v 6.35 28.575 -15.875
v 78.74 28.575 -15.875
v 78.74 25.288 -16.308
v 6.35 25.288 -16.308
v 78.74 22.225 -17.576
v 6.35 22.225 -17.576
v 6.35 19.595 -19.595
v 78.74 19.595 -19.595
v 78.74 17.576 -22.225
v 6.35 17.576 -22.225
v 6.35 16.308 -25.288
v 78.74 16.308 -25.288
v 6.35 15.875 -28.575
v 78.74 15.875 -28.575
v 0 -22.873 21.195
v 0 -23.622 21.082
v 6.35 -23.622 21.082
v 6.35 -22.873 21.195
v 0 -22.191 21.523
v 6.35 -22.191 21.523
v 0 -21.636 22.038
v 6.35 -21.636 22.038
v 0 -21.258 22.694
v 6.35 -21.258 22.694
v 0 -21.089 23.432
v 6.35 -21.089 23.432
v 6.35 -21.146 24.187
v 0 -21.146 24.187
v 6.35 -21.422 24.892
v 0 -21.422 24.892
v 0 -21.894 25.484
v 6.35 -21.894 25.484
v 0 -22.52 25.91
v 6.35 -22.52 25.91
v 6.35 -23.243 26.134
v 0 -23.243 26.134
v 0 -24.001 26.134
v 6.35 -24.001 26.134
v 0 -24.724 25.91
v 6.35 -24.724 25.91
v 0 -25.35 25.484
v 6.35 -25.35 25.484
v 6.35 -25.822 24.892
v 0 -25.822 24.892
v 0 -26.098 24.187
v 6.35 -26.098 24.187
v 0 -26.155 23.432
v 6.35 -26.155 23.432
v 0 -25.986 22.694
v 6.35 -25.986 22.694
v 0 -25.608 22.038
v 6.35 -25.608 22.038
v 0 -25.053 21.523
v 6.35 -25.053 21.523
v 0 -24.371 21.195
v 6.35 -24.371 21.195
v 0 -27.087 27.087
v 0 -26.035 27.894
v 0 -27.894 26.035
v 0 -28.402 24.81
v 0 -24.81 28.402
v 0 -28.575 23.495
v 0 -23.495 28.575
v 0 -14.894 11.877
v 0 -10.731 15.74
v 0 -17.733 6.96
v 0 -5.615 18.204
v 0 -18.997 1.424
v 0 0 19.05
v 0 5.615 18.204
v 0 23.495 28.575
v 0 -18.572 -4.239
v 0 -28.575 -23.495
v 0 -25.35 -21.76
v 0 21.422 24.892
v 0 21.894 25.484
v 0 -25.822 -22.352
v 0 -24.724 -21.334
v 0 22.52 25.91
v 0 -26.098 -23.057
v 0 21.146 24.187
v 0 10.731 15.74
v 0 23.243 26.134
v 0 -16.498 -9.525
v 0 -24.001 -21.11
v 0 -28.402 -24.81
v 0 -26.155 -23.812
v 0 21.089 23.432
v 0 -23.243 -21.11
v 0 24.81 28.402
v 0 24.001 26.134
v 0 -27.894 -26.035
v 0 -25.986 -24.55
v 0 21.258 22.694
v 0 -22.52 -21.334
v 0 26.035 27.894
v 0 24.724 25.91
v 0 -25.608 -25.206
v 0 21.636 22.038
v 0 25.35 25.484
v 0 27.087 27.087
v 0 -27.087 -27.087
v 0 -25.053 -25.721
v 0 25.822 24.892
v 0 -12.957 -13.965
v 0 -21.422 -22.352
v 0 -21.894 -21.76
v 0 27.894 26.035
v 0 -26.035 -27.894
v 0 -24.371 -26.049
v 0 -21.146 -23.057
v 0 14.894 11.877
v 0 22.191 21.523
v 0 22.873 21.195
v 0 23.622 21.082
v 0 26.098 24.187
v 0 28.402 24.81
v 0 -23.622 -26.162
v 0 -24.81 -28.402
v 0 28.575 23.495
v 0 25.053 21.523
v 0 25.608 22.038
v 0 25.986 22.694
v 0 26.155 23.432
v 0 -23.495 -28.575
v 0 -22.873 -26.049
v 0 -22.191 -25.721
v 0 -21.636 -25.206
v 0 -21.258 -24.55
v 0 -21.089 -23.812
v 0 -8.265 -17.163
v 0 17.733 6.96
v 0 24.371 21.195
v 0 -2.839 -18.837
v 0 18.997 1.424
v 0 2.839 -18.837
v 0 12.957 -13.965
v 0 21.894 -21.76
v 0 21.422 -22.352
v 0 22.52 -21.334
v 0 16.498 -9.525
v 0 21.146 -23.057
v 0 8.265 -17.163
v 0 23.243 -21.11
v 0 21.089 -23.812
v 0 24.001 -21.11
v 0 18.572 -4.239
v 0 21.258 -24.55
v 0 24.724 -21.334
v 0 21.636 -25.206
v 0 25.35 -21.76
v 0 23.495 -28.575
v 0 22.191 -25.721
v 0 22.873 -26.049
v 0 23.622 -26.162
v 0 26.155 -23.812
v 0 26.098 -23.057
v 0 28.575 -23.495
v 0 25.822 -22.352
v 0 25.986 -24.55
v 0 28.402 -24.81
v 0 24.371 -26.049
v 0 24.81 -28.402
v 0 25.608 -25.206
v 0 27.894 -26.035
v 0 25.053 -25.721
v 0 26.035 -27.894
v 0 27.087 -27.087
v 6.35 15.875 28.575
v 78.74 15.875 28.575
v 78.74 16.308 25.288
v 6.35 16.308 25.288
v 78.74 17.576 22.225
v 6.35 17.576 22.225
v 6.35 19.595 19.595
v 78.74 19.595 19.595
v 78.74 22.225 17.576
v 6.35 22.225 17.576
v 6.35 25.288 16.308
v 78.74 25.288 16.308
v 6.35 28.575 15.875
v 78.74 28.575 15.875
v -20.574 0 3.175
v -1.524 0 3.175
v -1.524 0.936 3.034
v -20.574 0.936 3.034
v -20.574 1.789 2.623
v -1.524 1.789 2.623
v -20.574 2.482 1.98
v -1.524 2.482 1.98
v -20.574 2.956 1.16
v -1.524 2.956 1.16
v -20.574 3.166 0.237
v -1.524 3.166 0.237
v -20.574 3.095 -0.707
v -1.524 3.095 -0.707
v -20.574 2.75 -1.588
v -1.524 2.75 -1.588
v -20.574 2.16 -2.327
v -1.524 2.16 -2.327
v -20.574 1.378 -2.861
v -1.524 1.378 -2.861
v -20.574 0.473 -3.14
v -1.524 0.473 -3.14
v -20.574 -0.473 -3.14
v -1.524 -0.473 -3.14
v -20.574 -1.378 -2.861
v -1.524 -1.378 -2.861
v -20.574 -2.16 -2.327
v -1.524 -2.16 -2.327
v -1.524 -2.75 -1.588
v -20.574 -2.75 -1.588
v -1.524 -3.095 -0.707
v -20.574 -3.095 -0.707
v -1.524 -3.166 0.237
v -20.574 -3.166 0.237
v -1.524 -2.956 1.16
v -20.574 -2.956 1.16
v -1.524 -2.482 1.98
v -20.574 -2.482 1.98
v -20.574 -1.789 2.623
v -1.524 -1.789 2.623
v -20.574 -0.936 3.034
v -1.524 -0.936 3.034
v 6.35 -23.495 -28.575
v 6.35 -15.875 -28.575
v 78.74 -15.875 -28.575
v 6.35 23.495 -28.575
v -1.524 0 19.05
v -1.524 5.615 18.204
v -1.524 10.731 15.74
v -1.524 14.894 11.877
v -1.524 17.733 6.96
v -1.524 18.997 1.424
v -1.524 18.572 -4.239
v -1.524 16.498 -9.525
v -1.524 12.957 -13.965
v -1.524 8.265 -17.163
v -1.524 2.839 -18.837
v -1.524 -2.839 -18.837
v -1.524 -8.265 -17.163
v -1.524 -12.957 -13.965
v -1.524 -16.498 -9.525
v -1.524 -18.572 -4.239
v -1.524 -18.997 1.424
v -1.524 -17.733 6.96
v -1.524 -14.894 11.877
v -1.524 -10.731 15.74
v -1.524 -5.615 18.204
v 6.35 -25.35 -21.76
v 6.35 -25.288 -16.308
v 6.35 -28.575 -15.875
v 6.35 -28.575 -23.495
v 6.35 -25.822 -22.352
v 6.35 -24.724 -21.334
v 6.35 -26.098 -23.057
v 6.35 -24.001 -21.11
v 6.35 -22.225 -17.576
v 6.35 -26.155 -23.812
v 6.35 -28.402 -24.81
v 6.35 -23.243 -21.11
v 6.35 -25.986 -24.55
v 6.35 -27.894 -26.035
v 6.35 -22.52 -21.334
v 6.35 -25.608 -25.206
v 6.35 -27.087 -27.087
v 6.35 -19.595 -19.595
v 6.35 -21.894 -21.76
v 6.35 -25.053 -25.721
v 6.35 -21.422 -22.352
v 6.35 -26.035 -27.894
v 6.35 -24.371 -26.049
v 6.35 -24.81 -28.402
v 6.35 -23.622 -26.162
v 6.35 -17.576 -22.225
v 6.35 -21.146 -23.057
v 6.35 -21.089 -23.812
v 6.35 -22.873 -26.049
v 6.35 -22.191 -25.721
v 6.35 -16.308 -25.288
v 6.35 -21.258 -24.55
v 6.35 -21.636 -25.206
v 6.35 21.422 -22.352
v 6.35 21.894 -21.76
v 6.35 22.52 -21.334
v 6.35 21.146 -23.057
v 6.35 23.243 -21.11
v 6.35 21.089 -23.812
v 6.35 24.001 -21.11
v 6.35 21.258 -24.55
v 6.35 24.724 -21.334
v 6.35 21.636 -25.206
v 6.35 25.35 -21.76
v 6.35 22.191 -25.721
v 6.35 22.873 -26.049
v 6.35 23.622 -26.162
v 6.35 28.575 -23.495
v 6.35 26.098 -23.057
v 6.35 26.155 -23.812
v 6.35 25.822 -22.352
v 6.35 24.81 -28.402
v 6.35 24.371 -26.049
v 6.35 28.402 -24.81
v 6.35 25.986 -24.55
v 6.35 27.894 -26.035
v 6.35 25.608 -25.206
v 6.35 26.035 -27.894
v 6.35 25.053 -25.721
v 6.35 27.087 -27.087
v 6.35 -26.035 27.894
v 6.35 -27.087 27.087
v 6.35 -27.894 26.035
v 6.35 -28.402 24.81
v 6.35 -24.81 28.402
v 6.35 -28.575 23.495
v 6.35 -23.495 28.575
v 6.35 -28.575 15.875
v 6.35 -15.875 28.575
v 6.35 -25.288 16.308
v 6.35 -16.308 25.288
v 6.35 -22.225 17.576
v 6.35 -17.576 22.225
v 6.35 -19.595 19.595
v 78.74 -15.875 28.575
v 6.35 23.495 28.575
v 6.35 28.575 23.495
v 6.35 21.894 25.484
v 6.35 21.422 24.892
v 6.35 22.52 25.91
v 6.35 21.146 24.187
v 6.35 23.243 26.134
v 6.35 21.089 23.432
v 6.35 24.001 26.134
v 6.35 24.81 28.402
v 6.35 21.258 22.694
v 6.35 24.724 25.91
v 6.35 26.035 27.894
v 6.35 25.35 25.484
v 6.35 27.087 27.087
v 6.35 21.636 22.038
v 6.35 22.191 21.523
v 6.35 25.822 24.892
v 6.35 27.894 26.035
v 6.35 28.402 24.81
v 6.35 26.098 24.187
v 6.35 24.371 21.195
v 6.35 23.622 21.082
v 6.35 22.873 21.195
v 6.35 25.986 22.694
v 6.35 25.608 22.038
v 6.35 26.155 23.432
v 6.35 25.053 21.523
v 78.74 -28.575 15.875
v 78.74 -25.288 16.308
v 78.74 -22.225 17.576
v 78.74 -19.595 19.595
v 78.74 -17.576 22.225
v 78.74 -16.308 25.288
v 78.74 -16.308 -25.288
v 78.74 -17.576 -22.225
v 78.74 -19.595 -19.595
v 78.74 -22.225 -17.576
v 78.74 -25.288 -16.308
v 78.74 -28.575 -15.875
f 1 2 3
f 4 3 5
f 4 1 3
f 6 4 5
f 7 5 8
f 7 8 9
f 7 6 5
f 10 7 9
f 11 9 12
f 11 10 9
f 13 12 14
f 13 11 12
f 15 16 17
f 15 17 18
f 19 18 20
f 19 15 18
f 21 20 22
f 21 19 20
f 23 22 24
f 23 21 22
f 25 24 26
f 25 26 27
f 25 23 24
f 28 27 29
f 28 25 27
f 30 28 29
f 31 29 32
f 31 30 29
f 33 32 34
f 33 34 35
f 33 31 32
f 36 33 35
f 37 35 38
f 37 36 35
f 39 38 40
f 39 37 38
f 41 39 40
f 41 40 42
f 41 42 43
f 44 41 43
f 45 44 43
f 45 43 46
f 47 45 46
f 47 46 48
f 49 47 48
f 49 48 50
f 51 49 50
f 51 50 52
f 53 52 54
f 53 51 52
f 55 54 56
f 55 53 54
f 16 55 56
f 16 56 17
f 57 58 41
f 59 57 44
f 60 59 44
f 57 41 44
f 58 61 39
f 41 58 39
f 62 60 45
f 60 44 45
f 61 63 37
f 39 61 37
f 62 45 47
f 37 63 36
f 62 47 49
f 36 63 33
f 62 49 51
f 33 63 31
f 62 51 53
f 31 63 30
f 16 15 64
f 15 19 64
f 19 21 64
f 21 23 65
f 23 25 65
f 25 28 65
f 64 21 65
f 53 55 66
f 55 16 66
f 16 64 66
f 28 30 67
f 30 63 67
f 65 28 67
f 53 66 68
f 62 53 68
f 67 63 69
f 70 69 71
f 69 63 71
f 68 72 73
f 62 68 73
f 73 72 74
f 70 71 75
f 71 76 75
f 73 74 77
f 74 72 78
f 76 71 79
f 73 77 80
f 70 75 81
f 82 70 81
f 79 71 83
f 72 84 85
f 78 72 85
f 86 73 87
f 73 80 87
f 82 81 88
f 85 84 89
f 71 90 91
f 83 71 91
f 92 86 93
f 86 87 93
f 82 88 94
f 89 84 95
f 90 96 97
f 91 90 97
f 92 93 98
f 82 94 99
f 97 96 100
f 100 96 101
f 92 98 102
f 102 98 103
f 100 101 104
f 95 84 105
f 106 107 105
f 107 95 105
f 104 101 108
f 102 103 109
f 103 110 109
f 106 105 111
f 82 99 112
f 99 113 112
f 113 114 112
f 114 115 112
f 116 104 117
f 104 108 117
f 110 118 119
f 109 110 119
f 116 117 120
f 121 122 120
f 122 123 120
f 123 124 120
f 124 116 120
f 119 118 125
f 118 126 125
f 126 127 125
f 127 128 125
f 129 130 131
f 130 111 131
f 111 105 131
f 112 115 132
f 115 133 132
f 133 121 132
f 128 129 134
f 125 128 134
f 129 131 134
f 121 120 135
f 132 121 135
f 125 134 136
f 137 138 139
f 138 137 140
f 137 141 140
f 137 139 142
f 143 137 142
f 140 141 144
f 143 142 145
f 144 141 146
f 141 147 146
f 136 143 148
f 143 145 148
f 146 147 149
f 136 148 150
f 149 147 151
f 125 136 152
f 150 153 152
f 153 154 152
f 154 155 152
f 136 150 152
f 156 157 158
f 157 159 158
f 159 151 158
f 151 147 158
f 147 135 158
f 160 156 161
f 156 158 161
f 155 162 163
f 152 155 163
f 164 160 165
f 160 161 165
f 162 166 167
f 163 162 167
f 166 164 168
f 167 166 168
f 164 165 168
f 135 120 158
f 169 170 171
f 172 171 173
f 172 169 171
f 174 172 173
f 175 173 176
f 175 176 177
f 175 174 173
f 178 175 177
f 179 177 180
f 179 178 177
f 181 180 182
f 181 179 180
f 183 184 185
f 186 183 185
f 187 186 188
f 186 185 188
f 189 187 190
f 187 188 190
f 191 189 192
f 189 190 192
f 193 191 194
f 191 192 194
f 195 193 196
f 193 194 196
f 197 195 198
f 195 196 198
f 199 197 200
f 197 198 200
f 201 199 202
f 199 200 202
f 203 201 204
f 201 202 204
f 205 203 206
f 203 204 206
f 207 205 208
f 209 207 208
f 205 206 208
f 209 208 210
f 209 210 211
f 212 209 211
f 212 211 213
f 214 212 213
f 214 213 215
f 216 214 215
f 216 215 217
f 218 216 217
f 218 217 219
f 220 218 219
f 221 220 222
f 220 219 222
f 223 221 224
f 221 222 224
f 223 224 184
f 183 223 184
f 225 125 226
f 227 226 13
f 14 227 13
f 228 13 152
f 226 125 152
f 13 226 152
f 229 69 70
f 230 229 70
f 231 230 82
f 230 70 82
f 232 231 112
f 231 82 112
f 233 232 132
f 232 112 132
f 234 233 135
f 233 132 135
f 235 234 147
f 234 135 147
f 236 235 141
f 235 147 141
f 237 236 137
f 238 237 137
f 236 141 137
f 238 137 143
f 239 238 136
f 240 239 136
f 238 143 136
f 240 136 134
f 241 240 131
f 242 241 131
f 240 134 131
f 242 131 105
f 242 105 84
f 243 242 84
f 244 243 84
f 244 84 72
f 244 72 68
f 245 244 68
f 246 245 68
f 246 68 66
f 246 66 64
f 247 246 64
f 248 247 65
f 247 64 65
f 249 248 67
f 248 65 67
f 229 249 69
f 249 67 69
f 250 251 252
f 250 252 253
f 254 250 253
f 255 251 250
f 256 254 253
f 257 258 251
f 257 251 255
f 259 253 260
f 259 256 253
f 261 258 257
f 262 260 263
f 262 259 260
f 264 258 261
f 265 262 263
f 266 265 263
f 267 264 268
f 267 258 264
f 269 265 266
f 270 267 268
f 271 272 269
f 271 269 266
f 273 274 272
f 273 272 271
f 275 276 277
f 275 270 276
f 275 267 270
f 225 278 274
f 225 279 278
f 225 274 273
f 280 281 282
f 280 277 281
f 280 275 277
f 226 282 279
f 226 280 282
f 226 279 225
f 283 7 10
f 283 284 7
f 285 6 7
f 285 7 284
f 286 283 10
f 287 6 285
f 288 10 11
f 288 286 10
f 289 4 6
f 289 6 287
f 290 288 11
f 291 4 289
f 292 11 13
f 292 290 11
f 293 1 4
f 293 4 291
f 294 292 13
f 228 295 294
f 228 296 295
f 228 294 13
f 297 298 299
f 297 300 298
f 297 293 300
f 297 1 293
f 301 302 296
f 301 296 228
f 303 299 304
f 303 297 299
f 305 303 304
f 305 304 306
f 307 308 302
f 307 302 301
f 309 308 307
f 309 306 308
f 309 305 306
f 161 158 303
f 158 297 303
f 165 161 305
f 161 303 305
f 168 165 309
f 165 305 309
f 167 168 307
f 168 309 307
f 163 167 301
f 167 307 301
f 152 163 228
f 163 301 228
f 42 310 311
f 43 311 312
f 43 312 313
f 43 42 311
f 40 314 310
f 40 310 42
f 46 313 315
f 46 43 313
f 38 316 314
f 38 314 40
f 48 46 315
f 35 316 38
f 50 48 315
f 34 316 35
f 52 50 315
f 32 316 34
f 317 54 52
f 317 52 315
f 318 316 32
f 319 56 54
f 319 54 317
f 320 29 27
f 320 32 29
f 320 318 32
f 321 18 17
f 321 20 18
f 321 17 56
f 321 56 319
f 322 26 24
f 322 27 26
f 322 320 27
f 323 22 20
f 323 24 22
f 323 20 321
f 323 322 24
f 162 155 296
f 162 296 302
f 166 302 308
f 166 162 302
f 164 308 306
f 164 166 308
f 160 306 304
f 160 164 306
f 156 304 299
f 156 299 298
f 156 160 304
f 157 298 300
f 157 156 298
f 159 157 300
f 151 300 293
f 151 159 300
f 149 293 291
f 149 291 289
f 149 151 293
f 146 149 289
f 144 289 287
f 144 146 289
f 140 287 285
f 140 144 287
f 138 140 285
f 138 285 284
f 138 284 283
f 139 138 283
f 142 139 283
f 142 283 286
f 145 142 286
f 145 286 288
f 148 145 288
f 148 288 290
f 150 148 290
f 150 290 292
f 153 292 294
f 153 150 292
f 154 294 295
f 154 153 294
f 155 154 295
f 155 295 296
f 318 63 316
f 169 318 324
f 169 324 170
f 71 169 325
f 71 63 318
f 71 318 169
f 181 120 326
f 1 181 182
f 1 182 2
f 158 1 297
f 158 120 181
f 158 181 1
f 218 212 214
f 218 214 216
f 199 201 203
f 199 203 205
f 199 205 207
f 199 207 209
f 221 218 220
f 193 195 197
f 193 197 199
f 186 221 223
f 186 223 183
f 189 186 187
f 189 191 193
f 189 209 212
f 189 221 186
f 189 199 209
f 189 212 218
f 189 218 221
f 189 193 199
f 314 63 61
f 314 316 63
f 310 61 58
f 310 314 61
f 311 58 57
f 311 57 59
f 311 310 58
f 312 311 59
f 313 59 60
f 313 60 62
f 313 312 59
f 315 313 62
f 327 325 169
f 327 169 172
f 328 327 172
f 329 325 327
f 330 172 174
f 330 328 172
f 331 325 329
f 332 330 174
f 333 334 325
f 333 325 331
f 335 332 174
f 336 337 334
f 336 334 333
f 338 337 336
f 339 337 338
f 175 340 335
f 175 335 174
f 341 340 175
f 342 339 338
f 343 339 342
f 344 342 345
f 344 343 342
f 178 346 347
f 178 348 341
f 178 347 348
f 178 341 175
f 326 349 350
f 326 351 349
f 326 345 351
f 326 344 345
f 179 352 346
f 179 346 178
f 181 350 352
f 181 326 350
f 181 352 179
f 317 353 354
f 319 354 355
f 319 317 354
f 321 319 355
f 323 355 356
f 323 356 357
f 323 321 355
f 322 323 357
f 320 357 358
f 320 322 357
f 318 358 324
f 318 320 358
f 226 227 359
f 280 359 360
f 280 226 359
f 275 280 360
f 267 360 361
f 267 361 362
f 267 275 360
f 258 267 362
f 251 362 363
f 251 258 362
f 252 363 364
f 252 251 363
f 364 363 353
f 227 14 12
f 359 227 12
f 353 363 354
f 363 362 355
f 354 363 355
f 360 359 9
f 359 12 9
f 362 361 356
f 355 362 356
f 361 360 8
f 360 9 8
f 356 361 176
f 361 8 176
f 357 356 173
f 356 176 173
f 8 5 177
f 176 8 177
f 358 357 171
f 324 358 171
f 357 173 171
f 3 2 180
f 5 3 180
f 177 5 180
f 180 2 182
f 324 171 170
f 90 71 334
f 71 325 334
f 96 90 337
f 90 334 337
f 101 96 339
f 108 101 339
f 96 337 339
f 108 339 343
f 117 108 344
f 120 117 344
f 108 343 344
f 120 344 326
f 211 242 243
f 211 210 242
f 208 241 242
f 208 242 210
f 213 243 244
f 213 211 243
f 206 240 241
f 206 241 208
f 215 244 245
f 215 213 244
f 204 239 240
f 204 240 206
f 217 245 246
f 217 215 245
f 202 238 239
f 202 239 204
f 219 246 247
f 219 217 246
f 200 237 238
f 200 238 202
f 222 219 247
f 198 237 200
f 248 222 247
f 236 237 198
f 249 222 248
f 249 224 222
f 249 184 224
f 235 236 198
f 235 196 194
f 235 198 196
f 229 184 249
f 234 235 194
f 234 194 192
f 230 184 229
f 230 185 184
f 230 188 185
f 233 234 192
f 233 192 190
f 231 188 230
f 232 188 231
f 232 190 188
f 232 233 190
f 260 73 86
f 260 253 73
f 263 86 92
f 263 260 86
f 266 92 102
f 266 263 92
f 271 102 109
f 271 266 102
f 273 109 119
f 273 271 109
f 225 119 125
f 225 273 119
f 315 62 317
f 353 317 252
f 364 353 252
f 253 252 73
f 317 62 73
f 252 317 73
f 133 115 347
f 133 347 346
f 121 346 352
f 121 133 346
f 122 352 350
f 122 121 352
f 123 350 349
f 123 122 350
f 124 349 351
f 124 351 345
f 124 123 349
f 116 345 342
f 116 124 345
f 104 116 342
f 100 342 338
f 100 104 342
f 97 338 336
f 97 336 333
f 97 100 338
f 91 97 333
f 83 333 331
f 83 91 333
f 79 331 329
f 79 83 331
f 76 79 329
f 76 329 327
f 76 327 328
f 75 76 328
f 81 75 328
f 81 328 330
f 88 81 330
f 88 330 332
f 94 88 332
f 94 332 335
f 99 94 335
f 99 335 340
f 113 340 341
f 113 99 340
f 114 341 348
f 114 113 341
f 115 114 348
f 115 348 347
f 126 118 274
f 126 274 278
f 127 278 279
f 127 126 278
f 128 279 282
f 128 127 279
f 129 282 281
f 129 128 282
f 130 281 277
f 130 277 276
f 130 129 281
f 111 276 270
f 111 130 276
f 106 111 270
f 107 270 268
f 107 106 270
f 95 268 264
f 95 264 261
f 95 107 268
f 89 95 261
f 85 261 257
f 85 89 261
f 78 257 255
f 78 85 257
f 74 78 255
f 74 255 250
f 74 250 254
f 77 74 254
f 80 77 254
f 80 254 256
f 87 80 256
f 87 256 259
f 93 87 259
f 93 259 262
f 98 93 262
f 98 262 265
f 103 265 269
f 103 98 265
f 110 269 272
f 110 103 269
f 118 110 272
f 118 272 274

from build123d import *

# Parameters (mm, degrees)
SKETCH1_W           = 57.15
SKETCH1_H           = 57.15
SKETCH1_R           = 2.54
BOSS_EXTRUDE1_DEPTH = 6.35
FILLET1_R           = 5.08
SKETCH5_R           = 19.05
BOSS_EXTRUDE4_DEPTH = 1.524
SKETCH6_R           = 3.175
BOSS_EXTRUDE5_DEPTH = 19.05
BOSS_EXTRUDE6_DEPTH = 72.39


with BuildPart() as part:
    # Sketch1 → Boss-Extrude1 (new body)
    with BuildSketch(Plane(origin=(0, 0, 0), x_dir=(0, 0, -1), z_dir=(1, 0, 0))):
        Rectangle(SKETCH1_W, SKETCH1_H)
        with Locations((23.622, 23.622)):
            Circle(SKETCH1_R, mode=Mode.SUBTRACT)
        with Locations((-23.622, 23.622)):
            Circle(SKETCH1_R, mode=Mode.SUBTRACT)
        with Locations((-23.622, -23.622)):
            Circle(SKETCH1_R, mode=Mode.SUBTRACT)
        with Locations((23.622, -23.622)):
            Circle(SKETCH1_R, mode=Mode.SUBTRACT)
    extrude(amount=BOSS_EXTRUDE1_DEPTH)

    # Fillet1
    fillet1_edges = [part.edges().sort_by_distance(p)[0] for p in [
        (3.175, 28.575, 28.575),
        (3.175, 28.575, -28.575),
        (3.175, -28.575, -28.575),
        (3.175, -28.575, 28.575),
    ]]
    fillet(fillet1_edges, radius=FILLET1_R)

    # Sketch5 → Boss-Extrude4 (add)
    with BuildSketch(Plane.ZY):
        Circle(SKETCH5_R)
    extrude(amount=BOSS_EXTRUDE4_DEPTH)

    # Sketch6 → Boss-Extrude5 (add)
    with BuildSketch(Plane.ZY.offset(1.524)):
        Circle(SKETCH6_R)
    extrude(amount=BOSS_EXTRUDE5_DEPTH)

    # Sketch7 → Boss-Extrude6 (add)
    with BuildSketch(Plane(origin=(6.35, 0, 0), x_dir=(0, 0, -1), z_dir=(1, 0, 0))):
        with BuildLine():
            Line((-15.875, 28.575), (15.875, 28.575))
            ThreePointArc((15.875, 28.575), (19.594743879, 19.594743879), (28.575, 15.875))
            Line((28.575, 15.875), (28.575, -15.875))
            ThreePointArc((28.575, -15.875), (19.594743879, -19.594743879), (15.875, -28.575))
            Line((15.875, -28.575), (-15.875, -28.575))
            ThreePointArc((-15.875, -28.575), (-19.594743879, -19.594743879), (-28.575, -15.875))
            Line((-28.575, -15.875), (-28.575, 15.875))
            ThreePointArc((-28.575, 15.875), (-19.594743879, 19.594743879), (-15.875, 28.575))
        make_face()
    extrude(amount=BOSS_EXTRUDE6_DEPTH)


solid = part.part
